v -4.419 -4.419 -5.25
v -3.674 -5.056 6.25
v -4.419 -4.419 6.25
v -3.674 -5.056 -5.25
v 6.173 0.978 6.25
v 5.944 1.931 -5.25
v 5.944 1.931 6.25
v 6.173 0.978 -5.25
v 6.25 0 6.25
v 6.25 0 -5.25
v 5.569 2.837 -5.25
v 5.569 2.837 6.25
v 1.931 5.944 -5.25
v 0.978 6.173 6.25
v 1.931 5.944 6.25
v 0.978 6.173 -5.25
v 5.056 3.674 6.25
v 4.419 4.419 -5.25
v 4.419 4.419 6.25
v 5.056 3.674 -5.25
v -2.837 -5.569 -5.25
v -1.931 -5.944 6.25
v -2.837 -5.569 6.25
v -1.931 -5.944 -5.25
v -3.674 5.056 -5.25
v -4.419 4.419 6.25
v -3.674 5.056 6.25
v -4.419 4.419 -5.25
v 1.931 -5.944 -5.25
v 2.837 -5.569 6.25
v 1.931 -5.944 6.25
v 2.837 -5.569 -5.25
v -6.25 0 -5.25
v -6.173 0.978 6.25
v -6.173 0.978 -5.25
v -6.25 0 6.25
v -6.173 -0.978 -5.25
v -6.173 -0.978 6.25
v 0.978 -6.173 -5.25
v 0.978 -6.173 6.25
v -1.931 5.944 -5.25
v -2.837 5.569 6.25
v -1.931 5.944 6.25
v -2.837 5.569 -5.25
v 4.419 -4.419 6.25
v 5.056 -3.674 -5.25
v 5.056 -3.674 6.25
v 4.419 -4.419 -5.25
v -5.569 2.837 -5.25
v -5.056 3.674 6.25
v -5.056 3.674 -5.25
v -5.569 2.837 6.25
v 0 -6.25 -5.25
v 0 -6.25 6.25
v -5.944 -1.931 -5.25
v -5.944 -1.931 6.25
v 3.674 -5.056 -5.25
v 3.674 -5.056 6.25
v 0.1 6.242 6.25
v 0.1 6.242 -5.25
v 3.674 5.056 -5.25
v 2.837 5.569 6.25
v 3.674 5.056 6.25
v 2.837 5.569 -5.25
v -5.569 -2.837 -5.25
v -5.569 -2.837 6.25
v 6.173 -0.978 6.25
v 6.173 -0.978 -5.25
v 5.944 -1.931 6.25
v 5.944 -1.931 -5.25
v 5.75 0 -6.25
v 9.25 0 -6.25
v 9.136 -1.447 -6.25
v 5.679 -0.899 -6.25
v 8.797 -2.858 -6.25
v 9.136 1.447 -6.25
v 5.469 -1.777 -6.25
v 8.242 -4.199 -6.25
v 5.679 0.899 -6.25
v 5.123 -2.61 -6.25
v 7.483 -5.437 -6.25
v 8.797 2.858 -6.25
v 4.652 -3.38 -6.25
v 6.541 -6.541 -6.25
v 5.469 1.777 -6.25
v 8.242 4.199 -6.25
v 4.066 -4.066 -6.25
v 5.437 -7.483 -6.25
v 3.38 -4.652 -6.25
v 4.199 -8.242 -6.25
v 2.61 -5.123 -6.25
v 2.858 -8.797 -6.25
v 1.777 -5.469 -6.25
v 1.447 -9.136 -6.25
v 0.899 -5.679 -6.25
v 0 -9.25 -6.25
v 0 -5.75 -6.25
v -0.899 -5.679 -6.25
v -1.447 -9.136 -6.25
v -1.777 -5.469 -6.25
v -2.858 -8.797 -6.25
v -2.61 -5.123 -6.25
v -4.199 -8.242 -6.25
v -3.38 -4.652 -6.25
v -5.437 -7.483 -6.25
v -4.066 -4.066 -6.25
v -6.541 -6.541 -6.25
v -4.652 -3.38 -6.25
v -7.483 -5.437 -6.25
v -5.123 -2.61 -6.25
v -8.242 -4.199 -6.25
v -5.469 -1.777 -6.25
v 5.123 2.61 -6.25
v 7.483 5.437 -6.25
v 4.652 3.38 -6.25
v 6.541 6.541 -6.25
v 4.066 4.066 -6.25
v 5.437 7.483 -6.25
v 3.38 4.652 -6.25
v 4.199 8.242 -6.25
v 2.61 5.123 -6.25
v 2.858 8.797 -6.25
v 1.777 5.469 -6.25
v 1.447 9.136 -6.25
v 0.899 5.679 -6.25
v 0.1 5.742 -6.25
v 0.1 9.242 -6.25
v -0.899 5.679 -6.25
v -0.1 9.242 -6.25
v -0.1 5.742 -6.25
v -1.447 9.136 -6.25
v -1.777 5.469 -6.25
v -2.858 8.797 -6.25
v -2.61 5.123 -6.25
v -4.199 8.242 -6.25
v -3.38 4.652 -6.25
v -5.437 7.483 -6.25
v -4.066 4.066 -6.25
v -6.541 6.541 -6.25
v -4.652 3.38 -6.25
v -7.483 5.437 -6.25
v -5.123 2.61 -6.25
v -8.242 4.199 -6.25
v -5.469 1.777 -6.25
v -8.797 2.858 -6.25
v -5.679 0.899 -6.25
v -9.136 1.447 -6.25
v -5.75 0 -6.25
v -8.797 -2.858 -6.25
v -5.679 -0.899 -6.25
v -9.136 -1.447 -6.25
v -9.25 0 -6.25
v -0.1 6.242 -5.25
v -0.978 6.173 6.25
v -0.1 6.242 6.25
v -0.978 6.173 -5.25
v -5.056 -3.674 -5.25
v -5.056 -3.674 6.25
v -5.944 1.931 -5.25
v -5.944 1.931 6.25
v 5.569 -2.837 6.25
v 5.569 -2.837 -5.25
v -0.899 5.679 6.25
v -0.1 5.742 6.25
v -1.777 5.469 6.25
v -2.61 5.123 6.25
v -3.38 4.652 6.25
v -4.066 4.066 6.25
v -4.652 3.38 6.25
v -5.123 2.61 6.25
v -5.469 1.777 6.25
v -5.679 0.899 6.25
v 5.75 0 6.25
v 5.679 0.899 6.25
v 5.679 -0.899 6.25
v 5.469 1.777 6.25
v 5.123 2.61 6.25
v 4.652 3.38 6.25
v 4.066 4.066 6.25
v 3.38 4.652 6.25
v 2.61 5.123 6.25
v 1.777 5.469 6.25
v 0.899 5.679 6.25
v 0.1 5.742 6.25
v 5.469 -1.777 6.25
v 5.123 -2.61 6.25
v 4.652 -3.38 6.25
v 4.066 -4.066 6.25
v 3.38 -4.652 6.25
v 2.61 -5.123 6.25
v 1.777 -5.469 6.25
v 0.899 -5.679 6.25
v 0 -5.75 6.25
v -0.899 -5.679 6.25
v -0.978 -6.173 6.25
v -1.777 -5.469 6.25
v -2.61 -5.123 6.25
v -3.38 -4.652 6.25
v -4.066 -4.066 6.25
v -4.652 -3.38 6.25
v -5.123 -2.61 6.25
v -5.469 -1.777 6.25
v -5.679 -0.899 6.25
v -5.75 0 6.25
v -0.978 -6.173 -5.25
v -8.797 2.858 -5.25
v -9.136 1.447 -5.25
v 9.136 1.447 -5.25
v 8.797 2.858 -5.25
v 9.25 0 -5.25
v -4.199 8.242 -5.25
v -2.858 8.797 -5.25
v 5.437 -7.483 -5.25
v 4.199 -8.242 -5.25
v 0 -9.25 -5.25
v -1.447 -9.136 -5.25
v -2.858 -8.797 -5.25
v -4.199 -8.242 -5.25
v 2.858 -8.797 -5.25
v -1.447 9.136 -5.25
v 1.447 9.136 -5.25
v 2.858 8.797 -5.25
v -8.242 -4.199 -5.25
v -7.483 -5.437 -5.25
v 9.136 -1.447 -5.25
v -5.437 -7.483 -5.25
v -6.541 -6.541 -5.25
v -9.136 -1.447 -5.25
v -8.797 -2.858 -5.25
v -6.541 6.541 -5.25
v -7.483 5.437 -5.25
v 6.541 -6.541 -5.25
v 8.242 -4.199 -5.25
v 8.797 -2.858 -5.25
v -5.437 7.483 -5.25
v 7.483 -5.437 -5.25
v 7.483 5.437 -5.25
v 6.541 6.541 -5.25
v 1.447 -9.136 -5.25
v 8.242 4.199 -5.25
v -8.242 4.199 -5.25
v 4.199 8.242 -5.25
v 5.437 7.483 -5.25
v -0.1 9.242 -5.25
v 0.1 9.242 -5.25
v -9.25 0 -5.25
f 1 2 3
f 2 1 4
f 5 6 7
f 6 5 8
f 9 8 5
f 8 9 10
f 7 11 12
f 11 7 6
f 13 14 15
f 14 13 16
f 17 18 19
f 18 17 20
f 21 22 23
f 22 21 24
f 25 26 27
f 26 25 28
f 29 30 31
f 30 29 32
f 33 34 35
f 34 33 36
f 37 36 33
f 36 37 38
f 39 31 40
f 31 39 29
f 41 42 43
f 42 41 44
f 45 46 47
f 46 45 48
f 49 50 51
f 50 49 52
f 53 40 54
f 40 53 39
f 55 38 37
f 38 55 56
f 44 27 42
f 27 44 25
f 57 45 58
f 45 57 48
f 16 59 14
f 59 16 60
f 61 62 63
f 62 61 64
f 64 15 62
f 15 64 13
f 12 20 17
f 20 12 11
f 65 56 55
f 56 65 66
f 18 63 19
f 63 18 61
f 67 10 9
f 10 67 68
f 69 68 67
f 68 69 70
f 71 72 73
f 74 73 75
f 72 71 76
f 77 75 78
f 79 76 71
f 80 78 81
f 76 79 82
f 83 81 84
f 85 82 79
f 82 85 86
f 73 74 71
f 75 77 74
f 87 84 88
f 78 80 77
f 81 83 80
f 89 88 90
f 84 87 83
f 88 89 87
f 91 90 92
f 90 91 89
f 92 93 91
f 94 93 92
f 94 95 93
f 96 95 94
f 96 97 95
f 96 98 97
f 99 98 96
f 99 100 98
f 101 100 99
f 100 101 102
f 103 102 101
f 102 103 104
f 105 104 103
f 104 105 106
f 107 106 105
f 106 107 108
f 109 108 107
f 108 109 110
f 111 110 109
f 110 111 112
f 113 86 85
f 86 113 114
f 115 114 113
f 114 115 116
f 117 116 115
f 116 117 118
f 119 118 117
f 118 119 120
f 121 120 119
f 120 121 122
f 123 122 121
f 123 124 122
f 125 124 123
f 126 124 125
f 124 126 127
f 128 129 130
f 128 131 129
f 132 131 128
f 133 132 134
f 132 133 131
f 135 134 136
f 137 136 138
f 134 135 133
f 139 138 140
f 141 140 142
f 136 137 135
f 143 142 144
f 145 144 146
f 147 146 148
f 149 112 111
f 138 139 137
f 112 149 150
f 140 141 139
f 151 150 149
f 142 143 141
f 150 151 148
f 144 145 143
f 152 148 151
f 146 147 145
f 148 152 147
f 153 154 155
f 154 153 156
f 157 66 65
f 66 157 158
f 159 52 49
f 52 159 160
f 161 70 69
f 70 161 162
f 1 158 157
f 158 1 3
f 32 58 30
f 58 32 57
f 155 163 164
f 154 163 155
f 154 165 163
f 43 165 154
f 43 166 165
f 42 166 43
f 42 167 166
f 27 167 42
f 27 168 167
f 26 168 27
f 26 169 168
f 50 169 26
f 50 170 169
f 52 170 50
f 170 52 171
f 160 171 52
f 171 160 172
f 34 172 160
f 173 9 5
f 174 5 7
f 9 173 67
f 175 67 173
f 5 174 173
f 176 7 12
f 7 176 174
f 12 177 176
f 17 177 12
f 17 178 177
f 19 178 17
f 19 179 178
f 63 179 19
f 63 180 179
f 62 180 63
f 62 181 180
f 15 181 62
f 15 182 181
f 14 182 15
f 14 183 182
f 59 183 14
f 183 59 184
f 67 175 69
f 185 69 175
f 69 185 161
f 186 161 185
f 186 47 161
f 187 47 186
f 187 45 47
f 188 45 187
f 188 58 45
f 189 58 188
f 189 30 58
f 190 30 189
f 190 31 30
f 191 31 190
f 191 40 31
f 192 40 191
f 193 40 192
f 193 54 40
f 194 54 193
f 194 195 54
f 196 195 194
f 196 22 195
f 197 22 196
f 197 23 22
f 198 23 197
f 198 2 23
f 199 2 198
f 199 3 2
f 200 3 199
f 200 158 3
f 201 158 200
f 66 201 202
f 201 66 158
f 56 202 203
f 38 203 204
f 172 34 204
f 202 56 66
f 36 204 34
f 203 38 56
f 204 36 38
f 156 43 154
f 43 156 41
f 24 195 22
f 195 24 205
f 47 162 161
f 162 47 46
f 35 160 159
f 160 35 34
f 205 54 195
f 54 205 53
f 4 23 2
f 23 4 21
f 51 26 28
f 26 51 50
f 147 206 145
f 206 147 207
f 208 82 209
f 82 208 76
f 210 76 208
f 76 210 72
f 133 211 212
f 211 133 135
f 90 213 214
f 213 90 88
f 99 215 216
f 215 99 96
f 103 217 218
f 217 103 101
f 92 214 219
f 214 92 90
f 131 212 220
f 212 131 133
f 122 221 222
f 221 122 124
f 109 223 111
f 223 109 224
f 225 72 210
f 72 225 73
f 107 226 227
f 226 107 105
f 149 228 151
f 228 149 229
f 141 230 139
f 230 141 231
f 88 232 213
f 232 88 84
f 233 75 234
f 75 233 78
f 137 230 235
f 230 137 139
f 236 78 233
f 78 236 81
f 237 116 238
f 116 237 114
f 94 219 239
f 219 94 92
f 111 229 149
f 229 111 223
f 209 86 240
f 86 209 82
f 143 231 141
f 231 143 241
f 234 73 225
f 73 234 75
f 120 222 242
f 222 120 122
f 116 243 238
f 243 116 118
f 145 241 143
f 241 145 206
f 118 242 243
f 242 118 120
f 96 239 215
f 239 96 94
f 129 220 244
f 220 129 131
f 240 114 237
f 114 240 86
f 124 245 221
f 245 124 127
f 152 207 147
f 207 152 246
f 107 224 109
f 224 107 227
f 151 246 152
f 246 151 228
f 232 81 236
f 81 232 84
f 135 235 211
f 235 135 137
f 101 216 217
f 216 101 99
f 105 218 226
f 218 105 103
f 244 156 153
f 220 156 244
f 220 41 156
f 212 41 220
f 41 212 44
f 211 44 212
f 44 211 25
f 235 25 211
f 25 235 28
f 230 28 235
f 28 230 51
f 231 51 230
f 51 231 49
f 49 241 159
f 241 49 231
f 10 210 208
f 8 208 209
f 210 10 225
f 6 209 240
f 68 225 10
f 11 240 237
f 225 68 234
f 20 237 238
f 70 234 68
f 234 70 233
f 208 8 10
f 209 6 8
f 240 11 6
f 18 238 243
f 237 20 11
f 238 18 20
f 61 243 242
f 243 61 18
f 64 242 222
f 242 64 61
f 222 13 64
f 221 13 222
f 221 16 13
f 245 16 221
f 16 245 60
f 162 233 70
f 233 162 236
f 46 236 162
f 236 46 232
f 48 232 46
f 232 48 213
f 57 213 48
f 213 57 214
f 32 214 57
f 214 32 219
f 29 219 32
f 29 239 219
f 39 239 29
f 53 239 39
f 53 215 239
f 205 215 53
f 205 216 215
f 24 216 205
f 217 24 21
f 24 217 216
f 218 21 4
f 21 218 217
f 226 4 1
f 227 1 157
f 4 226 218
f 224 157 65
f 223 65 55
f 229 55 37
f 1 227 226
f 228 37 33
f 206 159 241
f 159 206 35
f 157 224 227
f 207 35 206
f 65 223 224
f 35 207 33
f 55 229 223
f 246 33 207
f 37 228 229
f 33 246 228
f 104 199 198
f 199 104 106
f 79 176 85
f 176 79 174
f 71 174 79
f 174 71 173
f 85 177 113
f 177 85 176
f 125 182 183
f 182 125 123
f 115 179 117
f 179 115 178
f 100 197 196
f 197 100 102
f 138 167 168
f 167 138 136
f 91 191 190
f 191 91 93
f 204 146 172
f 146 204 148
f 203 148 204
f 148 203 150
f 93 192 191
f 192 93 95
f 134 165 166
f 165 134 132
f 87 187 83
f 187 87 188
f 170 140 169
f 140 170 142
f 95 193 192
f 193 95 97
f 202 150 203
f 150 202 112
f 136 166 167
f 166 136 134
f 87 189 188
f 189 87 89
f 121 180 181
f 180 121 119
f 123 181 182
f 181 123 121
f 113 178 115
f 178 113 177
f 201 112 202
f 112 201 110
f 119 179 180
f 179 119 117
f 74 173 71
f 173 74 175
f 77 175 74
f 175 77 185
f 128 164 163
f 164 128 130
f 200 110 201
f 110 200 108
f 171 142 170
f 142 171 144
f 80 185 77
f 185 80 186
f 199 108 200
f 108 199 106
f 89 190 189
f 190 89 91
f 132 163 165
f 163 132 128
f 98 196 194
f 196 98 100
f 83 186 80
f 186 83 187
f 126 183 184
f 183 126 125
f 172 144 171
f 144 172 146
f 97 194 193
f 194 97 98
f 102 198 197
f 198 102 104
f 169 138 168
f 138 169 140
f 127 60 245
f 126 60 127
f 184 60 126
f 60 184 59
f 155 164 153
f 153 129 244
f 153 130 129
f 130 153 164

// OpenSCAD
//Author: Chris Correll
//Date: 11/2/2022
//Description: Playdoh molds for basic openSCAD primitives

$fn = 40;
unit = 12.5; //one graph board square
wall_thickness = .5;
brim_thickness = 3;
brim_z = 1;
cut_thick = .2;
e = .1; //error term to elongate cut throughs for rounds and cubes and previewing

module mold_cube(w,l,h){
 difference(){
  union(){
   cube([l*unit,w*unit,h*unit],center=true); 
   translate([0,0,(-h*unit)/2+brim_z/2])
   cube([l*unit+2*brim_thickness,w*unit+2*brim_thickness,brim_z],center=true);
  }
//hole
 cube([l*unit-2*wall_thickness,w*unit-2*wall_thickness,h*unit+e],center=true);
//seam
 translate([0,(w*unit+brim_thickness*2)/2-(wall_thickness+brim_thickness)/2,0])
 #cube([cut_thick,wall_thickness+brim_thickness+e,h*unit+e],center=true);
 }
 
}

module mold_cylinder(w,h){
 difference(){
  union(){
   cylinder(h=h*unit, d=w*unit, center=true);
   translate([0,0,(-h*unit)/2+brim_z/2])
   cylinder(h=brim_z, d=w*unit+2*brim_thickness, center=true);
 }
//hole
 cylinder(h=h*unit+e, d=w*unit-2*wall_thickness, center=true);
//seam
 translate([0,(w*unit+brim_thickness*2)/2-(wall_thickness+brim_thickness)/2,0])
 #cube([cut_thick,wall_thickness+brim_thickness+e,h*unit+e],center=true);
}
}

module mold_hemisphere(d){
difference(){ 
union(){ 
difference(){
  sphere(d=d*unit);
  sphere(d=d*unit-2*wall_thickness);
  translate([0,0,-d*unit/2])
  cube(d*unit,center=true);
  }
//base
 translate([0,0,-brim_z/2])
 cylinder(d=d*unit+2*brim_thickness,h=brim_z,center=true);
}
  translate([0,0,-brim_z/2]) 
  cylinder(h=brim_z,d=d*unit-2*wall_thickness,center=true);
  
//seam
 translate([0,(d*unit+brim_thickness*2)/2-(wall_thickness+brim_thickness+d*unit/2)/2,0])
 #cube([cut_thick,d*unit/2+wall_thickness+brim_thickness+e,2*d/3*unit+e],center=true);
translate([0,-((d*unit+brim_thickness*2)/2-(wall_thickness+brim_thickness+d*unit/2)/2),0])
 #cube([cut_thick,d*unit/2+wall_thickness+brim_thickness+e,2*d/3*unit+e],center=true);
}
}

//import("Rectangle.stl",convexity=3); //check out the thingiverse model...
//mold_hemisphere(5);
mold_cylinder(1,1);
//mold_cube(1,4,1);
//mold_cube(2,8,.75);
